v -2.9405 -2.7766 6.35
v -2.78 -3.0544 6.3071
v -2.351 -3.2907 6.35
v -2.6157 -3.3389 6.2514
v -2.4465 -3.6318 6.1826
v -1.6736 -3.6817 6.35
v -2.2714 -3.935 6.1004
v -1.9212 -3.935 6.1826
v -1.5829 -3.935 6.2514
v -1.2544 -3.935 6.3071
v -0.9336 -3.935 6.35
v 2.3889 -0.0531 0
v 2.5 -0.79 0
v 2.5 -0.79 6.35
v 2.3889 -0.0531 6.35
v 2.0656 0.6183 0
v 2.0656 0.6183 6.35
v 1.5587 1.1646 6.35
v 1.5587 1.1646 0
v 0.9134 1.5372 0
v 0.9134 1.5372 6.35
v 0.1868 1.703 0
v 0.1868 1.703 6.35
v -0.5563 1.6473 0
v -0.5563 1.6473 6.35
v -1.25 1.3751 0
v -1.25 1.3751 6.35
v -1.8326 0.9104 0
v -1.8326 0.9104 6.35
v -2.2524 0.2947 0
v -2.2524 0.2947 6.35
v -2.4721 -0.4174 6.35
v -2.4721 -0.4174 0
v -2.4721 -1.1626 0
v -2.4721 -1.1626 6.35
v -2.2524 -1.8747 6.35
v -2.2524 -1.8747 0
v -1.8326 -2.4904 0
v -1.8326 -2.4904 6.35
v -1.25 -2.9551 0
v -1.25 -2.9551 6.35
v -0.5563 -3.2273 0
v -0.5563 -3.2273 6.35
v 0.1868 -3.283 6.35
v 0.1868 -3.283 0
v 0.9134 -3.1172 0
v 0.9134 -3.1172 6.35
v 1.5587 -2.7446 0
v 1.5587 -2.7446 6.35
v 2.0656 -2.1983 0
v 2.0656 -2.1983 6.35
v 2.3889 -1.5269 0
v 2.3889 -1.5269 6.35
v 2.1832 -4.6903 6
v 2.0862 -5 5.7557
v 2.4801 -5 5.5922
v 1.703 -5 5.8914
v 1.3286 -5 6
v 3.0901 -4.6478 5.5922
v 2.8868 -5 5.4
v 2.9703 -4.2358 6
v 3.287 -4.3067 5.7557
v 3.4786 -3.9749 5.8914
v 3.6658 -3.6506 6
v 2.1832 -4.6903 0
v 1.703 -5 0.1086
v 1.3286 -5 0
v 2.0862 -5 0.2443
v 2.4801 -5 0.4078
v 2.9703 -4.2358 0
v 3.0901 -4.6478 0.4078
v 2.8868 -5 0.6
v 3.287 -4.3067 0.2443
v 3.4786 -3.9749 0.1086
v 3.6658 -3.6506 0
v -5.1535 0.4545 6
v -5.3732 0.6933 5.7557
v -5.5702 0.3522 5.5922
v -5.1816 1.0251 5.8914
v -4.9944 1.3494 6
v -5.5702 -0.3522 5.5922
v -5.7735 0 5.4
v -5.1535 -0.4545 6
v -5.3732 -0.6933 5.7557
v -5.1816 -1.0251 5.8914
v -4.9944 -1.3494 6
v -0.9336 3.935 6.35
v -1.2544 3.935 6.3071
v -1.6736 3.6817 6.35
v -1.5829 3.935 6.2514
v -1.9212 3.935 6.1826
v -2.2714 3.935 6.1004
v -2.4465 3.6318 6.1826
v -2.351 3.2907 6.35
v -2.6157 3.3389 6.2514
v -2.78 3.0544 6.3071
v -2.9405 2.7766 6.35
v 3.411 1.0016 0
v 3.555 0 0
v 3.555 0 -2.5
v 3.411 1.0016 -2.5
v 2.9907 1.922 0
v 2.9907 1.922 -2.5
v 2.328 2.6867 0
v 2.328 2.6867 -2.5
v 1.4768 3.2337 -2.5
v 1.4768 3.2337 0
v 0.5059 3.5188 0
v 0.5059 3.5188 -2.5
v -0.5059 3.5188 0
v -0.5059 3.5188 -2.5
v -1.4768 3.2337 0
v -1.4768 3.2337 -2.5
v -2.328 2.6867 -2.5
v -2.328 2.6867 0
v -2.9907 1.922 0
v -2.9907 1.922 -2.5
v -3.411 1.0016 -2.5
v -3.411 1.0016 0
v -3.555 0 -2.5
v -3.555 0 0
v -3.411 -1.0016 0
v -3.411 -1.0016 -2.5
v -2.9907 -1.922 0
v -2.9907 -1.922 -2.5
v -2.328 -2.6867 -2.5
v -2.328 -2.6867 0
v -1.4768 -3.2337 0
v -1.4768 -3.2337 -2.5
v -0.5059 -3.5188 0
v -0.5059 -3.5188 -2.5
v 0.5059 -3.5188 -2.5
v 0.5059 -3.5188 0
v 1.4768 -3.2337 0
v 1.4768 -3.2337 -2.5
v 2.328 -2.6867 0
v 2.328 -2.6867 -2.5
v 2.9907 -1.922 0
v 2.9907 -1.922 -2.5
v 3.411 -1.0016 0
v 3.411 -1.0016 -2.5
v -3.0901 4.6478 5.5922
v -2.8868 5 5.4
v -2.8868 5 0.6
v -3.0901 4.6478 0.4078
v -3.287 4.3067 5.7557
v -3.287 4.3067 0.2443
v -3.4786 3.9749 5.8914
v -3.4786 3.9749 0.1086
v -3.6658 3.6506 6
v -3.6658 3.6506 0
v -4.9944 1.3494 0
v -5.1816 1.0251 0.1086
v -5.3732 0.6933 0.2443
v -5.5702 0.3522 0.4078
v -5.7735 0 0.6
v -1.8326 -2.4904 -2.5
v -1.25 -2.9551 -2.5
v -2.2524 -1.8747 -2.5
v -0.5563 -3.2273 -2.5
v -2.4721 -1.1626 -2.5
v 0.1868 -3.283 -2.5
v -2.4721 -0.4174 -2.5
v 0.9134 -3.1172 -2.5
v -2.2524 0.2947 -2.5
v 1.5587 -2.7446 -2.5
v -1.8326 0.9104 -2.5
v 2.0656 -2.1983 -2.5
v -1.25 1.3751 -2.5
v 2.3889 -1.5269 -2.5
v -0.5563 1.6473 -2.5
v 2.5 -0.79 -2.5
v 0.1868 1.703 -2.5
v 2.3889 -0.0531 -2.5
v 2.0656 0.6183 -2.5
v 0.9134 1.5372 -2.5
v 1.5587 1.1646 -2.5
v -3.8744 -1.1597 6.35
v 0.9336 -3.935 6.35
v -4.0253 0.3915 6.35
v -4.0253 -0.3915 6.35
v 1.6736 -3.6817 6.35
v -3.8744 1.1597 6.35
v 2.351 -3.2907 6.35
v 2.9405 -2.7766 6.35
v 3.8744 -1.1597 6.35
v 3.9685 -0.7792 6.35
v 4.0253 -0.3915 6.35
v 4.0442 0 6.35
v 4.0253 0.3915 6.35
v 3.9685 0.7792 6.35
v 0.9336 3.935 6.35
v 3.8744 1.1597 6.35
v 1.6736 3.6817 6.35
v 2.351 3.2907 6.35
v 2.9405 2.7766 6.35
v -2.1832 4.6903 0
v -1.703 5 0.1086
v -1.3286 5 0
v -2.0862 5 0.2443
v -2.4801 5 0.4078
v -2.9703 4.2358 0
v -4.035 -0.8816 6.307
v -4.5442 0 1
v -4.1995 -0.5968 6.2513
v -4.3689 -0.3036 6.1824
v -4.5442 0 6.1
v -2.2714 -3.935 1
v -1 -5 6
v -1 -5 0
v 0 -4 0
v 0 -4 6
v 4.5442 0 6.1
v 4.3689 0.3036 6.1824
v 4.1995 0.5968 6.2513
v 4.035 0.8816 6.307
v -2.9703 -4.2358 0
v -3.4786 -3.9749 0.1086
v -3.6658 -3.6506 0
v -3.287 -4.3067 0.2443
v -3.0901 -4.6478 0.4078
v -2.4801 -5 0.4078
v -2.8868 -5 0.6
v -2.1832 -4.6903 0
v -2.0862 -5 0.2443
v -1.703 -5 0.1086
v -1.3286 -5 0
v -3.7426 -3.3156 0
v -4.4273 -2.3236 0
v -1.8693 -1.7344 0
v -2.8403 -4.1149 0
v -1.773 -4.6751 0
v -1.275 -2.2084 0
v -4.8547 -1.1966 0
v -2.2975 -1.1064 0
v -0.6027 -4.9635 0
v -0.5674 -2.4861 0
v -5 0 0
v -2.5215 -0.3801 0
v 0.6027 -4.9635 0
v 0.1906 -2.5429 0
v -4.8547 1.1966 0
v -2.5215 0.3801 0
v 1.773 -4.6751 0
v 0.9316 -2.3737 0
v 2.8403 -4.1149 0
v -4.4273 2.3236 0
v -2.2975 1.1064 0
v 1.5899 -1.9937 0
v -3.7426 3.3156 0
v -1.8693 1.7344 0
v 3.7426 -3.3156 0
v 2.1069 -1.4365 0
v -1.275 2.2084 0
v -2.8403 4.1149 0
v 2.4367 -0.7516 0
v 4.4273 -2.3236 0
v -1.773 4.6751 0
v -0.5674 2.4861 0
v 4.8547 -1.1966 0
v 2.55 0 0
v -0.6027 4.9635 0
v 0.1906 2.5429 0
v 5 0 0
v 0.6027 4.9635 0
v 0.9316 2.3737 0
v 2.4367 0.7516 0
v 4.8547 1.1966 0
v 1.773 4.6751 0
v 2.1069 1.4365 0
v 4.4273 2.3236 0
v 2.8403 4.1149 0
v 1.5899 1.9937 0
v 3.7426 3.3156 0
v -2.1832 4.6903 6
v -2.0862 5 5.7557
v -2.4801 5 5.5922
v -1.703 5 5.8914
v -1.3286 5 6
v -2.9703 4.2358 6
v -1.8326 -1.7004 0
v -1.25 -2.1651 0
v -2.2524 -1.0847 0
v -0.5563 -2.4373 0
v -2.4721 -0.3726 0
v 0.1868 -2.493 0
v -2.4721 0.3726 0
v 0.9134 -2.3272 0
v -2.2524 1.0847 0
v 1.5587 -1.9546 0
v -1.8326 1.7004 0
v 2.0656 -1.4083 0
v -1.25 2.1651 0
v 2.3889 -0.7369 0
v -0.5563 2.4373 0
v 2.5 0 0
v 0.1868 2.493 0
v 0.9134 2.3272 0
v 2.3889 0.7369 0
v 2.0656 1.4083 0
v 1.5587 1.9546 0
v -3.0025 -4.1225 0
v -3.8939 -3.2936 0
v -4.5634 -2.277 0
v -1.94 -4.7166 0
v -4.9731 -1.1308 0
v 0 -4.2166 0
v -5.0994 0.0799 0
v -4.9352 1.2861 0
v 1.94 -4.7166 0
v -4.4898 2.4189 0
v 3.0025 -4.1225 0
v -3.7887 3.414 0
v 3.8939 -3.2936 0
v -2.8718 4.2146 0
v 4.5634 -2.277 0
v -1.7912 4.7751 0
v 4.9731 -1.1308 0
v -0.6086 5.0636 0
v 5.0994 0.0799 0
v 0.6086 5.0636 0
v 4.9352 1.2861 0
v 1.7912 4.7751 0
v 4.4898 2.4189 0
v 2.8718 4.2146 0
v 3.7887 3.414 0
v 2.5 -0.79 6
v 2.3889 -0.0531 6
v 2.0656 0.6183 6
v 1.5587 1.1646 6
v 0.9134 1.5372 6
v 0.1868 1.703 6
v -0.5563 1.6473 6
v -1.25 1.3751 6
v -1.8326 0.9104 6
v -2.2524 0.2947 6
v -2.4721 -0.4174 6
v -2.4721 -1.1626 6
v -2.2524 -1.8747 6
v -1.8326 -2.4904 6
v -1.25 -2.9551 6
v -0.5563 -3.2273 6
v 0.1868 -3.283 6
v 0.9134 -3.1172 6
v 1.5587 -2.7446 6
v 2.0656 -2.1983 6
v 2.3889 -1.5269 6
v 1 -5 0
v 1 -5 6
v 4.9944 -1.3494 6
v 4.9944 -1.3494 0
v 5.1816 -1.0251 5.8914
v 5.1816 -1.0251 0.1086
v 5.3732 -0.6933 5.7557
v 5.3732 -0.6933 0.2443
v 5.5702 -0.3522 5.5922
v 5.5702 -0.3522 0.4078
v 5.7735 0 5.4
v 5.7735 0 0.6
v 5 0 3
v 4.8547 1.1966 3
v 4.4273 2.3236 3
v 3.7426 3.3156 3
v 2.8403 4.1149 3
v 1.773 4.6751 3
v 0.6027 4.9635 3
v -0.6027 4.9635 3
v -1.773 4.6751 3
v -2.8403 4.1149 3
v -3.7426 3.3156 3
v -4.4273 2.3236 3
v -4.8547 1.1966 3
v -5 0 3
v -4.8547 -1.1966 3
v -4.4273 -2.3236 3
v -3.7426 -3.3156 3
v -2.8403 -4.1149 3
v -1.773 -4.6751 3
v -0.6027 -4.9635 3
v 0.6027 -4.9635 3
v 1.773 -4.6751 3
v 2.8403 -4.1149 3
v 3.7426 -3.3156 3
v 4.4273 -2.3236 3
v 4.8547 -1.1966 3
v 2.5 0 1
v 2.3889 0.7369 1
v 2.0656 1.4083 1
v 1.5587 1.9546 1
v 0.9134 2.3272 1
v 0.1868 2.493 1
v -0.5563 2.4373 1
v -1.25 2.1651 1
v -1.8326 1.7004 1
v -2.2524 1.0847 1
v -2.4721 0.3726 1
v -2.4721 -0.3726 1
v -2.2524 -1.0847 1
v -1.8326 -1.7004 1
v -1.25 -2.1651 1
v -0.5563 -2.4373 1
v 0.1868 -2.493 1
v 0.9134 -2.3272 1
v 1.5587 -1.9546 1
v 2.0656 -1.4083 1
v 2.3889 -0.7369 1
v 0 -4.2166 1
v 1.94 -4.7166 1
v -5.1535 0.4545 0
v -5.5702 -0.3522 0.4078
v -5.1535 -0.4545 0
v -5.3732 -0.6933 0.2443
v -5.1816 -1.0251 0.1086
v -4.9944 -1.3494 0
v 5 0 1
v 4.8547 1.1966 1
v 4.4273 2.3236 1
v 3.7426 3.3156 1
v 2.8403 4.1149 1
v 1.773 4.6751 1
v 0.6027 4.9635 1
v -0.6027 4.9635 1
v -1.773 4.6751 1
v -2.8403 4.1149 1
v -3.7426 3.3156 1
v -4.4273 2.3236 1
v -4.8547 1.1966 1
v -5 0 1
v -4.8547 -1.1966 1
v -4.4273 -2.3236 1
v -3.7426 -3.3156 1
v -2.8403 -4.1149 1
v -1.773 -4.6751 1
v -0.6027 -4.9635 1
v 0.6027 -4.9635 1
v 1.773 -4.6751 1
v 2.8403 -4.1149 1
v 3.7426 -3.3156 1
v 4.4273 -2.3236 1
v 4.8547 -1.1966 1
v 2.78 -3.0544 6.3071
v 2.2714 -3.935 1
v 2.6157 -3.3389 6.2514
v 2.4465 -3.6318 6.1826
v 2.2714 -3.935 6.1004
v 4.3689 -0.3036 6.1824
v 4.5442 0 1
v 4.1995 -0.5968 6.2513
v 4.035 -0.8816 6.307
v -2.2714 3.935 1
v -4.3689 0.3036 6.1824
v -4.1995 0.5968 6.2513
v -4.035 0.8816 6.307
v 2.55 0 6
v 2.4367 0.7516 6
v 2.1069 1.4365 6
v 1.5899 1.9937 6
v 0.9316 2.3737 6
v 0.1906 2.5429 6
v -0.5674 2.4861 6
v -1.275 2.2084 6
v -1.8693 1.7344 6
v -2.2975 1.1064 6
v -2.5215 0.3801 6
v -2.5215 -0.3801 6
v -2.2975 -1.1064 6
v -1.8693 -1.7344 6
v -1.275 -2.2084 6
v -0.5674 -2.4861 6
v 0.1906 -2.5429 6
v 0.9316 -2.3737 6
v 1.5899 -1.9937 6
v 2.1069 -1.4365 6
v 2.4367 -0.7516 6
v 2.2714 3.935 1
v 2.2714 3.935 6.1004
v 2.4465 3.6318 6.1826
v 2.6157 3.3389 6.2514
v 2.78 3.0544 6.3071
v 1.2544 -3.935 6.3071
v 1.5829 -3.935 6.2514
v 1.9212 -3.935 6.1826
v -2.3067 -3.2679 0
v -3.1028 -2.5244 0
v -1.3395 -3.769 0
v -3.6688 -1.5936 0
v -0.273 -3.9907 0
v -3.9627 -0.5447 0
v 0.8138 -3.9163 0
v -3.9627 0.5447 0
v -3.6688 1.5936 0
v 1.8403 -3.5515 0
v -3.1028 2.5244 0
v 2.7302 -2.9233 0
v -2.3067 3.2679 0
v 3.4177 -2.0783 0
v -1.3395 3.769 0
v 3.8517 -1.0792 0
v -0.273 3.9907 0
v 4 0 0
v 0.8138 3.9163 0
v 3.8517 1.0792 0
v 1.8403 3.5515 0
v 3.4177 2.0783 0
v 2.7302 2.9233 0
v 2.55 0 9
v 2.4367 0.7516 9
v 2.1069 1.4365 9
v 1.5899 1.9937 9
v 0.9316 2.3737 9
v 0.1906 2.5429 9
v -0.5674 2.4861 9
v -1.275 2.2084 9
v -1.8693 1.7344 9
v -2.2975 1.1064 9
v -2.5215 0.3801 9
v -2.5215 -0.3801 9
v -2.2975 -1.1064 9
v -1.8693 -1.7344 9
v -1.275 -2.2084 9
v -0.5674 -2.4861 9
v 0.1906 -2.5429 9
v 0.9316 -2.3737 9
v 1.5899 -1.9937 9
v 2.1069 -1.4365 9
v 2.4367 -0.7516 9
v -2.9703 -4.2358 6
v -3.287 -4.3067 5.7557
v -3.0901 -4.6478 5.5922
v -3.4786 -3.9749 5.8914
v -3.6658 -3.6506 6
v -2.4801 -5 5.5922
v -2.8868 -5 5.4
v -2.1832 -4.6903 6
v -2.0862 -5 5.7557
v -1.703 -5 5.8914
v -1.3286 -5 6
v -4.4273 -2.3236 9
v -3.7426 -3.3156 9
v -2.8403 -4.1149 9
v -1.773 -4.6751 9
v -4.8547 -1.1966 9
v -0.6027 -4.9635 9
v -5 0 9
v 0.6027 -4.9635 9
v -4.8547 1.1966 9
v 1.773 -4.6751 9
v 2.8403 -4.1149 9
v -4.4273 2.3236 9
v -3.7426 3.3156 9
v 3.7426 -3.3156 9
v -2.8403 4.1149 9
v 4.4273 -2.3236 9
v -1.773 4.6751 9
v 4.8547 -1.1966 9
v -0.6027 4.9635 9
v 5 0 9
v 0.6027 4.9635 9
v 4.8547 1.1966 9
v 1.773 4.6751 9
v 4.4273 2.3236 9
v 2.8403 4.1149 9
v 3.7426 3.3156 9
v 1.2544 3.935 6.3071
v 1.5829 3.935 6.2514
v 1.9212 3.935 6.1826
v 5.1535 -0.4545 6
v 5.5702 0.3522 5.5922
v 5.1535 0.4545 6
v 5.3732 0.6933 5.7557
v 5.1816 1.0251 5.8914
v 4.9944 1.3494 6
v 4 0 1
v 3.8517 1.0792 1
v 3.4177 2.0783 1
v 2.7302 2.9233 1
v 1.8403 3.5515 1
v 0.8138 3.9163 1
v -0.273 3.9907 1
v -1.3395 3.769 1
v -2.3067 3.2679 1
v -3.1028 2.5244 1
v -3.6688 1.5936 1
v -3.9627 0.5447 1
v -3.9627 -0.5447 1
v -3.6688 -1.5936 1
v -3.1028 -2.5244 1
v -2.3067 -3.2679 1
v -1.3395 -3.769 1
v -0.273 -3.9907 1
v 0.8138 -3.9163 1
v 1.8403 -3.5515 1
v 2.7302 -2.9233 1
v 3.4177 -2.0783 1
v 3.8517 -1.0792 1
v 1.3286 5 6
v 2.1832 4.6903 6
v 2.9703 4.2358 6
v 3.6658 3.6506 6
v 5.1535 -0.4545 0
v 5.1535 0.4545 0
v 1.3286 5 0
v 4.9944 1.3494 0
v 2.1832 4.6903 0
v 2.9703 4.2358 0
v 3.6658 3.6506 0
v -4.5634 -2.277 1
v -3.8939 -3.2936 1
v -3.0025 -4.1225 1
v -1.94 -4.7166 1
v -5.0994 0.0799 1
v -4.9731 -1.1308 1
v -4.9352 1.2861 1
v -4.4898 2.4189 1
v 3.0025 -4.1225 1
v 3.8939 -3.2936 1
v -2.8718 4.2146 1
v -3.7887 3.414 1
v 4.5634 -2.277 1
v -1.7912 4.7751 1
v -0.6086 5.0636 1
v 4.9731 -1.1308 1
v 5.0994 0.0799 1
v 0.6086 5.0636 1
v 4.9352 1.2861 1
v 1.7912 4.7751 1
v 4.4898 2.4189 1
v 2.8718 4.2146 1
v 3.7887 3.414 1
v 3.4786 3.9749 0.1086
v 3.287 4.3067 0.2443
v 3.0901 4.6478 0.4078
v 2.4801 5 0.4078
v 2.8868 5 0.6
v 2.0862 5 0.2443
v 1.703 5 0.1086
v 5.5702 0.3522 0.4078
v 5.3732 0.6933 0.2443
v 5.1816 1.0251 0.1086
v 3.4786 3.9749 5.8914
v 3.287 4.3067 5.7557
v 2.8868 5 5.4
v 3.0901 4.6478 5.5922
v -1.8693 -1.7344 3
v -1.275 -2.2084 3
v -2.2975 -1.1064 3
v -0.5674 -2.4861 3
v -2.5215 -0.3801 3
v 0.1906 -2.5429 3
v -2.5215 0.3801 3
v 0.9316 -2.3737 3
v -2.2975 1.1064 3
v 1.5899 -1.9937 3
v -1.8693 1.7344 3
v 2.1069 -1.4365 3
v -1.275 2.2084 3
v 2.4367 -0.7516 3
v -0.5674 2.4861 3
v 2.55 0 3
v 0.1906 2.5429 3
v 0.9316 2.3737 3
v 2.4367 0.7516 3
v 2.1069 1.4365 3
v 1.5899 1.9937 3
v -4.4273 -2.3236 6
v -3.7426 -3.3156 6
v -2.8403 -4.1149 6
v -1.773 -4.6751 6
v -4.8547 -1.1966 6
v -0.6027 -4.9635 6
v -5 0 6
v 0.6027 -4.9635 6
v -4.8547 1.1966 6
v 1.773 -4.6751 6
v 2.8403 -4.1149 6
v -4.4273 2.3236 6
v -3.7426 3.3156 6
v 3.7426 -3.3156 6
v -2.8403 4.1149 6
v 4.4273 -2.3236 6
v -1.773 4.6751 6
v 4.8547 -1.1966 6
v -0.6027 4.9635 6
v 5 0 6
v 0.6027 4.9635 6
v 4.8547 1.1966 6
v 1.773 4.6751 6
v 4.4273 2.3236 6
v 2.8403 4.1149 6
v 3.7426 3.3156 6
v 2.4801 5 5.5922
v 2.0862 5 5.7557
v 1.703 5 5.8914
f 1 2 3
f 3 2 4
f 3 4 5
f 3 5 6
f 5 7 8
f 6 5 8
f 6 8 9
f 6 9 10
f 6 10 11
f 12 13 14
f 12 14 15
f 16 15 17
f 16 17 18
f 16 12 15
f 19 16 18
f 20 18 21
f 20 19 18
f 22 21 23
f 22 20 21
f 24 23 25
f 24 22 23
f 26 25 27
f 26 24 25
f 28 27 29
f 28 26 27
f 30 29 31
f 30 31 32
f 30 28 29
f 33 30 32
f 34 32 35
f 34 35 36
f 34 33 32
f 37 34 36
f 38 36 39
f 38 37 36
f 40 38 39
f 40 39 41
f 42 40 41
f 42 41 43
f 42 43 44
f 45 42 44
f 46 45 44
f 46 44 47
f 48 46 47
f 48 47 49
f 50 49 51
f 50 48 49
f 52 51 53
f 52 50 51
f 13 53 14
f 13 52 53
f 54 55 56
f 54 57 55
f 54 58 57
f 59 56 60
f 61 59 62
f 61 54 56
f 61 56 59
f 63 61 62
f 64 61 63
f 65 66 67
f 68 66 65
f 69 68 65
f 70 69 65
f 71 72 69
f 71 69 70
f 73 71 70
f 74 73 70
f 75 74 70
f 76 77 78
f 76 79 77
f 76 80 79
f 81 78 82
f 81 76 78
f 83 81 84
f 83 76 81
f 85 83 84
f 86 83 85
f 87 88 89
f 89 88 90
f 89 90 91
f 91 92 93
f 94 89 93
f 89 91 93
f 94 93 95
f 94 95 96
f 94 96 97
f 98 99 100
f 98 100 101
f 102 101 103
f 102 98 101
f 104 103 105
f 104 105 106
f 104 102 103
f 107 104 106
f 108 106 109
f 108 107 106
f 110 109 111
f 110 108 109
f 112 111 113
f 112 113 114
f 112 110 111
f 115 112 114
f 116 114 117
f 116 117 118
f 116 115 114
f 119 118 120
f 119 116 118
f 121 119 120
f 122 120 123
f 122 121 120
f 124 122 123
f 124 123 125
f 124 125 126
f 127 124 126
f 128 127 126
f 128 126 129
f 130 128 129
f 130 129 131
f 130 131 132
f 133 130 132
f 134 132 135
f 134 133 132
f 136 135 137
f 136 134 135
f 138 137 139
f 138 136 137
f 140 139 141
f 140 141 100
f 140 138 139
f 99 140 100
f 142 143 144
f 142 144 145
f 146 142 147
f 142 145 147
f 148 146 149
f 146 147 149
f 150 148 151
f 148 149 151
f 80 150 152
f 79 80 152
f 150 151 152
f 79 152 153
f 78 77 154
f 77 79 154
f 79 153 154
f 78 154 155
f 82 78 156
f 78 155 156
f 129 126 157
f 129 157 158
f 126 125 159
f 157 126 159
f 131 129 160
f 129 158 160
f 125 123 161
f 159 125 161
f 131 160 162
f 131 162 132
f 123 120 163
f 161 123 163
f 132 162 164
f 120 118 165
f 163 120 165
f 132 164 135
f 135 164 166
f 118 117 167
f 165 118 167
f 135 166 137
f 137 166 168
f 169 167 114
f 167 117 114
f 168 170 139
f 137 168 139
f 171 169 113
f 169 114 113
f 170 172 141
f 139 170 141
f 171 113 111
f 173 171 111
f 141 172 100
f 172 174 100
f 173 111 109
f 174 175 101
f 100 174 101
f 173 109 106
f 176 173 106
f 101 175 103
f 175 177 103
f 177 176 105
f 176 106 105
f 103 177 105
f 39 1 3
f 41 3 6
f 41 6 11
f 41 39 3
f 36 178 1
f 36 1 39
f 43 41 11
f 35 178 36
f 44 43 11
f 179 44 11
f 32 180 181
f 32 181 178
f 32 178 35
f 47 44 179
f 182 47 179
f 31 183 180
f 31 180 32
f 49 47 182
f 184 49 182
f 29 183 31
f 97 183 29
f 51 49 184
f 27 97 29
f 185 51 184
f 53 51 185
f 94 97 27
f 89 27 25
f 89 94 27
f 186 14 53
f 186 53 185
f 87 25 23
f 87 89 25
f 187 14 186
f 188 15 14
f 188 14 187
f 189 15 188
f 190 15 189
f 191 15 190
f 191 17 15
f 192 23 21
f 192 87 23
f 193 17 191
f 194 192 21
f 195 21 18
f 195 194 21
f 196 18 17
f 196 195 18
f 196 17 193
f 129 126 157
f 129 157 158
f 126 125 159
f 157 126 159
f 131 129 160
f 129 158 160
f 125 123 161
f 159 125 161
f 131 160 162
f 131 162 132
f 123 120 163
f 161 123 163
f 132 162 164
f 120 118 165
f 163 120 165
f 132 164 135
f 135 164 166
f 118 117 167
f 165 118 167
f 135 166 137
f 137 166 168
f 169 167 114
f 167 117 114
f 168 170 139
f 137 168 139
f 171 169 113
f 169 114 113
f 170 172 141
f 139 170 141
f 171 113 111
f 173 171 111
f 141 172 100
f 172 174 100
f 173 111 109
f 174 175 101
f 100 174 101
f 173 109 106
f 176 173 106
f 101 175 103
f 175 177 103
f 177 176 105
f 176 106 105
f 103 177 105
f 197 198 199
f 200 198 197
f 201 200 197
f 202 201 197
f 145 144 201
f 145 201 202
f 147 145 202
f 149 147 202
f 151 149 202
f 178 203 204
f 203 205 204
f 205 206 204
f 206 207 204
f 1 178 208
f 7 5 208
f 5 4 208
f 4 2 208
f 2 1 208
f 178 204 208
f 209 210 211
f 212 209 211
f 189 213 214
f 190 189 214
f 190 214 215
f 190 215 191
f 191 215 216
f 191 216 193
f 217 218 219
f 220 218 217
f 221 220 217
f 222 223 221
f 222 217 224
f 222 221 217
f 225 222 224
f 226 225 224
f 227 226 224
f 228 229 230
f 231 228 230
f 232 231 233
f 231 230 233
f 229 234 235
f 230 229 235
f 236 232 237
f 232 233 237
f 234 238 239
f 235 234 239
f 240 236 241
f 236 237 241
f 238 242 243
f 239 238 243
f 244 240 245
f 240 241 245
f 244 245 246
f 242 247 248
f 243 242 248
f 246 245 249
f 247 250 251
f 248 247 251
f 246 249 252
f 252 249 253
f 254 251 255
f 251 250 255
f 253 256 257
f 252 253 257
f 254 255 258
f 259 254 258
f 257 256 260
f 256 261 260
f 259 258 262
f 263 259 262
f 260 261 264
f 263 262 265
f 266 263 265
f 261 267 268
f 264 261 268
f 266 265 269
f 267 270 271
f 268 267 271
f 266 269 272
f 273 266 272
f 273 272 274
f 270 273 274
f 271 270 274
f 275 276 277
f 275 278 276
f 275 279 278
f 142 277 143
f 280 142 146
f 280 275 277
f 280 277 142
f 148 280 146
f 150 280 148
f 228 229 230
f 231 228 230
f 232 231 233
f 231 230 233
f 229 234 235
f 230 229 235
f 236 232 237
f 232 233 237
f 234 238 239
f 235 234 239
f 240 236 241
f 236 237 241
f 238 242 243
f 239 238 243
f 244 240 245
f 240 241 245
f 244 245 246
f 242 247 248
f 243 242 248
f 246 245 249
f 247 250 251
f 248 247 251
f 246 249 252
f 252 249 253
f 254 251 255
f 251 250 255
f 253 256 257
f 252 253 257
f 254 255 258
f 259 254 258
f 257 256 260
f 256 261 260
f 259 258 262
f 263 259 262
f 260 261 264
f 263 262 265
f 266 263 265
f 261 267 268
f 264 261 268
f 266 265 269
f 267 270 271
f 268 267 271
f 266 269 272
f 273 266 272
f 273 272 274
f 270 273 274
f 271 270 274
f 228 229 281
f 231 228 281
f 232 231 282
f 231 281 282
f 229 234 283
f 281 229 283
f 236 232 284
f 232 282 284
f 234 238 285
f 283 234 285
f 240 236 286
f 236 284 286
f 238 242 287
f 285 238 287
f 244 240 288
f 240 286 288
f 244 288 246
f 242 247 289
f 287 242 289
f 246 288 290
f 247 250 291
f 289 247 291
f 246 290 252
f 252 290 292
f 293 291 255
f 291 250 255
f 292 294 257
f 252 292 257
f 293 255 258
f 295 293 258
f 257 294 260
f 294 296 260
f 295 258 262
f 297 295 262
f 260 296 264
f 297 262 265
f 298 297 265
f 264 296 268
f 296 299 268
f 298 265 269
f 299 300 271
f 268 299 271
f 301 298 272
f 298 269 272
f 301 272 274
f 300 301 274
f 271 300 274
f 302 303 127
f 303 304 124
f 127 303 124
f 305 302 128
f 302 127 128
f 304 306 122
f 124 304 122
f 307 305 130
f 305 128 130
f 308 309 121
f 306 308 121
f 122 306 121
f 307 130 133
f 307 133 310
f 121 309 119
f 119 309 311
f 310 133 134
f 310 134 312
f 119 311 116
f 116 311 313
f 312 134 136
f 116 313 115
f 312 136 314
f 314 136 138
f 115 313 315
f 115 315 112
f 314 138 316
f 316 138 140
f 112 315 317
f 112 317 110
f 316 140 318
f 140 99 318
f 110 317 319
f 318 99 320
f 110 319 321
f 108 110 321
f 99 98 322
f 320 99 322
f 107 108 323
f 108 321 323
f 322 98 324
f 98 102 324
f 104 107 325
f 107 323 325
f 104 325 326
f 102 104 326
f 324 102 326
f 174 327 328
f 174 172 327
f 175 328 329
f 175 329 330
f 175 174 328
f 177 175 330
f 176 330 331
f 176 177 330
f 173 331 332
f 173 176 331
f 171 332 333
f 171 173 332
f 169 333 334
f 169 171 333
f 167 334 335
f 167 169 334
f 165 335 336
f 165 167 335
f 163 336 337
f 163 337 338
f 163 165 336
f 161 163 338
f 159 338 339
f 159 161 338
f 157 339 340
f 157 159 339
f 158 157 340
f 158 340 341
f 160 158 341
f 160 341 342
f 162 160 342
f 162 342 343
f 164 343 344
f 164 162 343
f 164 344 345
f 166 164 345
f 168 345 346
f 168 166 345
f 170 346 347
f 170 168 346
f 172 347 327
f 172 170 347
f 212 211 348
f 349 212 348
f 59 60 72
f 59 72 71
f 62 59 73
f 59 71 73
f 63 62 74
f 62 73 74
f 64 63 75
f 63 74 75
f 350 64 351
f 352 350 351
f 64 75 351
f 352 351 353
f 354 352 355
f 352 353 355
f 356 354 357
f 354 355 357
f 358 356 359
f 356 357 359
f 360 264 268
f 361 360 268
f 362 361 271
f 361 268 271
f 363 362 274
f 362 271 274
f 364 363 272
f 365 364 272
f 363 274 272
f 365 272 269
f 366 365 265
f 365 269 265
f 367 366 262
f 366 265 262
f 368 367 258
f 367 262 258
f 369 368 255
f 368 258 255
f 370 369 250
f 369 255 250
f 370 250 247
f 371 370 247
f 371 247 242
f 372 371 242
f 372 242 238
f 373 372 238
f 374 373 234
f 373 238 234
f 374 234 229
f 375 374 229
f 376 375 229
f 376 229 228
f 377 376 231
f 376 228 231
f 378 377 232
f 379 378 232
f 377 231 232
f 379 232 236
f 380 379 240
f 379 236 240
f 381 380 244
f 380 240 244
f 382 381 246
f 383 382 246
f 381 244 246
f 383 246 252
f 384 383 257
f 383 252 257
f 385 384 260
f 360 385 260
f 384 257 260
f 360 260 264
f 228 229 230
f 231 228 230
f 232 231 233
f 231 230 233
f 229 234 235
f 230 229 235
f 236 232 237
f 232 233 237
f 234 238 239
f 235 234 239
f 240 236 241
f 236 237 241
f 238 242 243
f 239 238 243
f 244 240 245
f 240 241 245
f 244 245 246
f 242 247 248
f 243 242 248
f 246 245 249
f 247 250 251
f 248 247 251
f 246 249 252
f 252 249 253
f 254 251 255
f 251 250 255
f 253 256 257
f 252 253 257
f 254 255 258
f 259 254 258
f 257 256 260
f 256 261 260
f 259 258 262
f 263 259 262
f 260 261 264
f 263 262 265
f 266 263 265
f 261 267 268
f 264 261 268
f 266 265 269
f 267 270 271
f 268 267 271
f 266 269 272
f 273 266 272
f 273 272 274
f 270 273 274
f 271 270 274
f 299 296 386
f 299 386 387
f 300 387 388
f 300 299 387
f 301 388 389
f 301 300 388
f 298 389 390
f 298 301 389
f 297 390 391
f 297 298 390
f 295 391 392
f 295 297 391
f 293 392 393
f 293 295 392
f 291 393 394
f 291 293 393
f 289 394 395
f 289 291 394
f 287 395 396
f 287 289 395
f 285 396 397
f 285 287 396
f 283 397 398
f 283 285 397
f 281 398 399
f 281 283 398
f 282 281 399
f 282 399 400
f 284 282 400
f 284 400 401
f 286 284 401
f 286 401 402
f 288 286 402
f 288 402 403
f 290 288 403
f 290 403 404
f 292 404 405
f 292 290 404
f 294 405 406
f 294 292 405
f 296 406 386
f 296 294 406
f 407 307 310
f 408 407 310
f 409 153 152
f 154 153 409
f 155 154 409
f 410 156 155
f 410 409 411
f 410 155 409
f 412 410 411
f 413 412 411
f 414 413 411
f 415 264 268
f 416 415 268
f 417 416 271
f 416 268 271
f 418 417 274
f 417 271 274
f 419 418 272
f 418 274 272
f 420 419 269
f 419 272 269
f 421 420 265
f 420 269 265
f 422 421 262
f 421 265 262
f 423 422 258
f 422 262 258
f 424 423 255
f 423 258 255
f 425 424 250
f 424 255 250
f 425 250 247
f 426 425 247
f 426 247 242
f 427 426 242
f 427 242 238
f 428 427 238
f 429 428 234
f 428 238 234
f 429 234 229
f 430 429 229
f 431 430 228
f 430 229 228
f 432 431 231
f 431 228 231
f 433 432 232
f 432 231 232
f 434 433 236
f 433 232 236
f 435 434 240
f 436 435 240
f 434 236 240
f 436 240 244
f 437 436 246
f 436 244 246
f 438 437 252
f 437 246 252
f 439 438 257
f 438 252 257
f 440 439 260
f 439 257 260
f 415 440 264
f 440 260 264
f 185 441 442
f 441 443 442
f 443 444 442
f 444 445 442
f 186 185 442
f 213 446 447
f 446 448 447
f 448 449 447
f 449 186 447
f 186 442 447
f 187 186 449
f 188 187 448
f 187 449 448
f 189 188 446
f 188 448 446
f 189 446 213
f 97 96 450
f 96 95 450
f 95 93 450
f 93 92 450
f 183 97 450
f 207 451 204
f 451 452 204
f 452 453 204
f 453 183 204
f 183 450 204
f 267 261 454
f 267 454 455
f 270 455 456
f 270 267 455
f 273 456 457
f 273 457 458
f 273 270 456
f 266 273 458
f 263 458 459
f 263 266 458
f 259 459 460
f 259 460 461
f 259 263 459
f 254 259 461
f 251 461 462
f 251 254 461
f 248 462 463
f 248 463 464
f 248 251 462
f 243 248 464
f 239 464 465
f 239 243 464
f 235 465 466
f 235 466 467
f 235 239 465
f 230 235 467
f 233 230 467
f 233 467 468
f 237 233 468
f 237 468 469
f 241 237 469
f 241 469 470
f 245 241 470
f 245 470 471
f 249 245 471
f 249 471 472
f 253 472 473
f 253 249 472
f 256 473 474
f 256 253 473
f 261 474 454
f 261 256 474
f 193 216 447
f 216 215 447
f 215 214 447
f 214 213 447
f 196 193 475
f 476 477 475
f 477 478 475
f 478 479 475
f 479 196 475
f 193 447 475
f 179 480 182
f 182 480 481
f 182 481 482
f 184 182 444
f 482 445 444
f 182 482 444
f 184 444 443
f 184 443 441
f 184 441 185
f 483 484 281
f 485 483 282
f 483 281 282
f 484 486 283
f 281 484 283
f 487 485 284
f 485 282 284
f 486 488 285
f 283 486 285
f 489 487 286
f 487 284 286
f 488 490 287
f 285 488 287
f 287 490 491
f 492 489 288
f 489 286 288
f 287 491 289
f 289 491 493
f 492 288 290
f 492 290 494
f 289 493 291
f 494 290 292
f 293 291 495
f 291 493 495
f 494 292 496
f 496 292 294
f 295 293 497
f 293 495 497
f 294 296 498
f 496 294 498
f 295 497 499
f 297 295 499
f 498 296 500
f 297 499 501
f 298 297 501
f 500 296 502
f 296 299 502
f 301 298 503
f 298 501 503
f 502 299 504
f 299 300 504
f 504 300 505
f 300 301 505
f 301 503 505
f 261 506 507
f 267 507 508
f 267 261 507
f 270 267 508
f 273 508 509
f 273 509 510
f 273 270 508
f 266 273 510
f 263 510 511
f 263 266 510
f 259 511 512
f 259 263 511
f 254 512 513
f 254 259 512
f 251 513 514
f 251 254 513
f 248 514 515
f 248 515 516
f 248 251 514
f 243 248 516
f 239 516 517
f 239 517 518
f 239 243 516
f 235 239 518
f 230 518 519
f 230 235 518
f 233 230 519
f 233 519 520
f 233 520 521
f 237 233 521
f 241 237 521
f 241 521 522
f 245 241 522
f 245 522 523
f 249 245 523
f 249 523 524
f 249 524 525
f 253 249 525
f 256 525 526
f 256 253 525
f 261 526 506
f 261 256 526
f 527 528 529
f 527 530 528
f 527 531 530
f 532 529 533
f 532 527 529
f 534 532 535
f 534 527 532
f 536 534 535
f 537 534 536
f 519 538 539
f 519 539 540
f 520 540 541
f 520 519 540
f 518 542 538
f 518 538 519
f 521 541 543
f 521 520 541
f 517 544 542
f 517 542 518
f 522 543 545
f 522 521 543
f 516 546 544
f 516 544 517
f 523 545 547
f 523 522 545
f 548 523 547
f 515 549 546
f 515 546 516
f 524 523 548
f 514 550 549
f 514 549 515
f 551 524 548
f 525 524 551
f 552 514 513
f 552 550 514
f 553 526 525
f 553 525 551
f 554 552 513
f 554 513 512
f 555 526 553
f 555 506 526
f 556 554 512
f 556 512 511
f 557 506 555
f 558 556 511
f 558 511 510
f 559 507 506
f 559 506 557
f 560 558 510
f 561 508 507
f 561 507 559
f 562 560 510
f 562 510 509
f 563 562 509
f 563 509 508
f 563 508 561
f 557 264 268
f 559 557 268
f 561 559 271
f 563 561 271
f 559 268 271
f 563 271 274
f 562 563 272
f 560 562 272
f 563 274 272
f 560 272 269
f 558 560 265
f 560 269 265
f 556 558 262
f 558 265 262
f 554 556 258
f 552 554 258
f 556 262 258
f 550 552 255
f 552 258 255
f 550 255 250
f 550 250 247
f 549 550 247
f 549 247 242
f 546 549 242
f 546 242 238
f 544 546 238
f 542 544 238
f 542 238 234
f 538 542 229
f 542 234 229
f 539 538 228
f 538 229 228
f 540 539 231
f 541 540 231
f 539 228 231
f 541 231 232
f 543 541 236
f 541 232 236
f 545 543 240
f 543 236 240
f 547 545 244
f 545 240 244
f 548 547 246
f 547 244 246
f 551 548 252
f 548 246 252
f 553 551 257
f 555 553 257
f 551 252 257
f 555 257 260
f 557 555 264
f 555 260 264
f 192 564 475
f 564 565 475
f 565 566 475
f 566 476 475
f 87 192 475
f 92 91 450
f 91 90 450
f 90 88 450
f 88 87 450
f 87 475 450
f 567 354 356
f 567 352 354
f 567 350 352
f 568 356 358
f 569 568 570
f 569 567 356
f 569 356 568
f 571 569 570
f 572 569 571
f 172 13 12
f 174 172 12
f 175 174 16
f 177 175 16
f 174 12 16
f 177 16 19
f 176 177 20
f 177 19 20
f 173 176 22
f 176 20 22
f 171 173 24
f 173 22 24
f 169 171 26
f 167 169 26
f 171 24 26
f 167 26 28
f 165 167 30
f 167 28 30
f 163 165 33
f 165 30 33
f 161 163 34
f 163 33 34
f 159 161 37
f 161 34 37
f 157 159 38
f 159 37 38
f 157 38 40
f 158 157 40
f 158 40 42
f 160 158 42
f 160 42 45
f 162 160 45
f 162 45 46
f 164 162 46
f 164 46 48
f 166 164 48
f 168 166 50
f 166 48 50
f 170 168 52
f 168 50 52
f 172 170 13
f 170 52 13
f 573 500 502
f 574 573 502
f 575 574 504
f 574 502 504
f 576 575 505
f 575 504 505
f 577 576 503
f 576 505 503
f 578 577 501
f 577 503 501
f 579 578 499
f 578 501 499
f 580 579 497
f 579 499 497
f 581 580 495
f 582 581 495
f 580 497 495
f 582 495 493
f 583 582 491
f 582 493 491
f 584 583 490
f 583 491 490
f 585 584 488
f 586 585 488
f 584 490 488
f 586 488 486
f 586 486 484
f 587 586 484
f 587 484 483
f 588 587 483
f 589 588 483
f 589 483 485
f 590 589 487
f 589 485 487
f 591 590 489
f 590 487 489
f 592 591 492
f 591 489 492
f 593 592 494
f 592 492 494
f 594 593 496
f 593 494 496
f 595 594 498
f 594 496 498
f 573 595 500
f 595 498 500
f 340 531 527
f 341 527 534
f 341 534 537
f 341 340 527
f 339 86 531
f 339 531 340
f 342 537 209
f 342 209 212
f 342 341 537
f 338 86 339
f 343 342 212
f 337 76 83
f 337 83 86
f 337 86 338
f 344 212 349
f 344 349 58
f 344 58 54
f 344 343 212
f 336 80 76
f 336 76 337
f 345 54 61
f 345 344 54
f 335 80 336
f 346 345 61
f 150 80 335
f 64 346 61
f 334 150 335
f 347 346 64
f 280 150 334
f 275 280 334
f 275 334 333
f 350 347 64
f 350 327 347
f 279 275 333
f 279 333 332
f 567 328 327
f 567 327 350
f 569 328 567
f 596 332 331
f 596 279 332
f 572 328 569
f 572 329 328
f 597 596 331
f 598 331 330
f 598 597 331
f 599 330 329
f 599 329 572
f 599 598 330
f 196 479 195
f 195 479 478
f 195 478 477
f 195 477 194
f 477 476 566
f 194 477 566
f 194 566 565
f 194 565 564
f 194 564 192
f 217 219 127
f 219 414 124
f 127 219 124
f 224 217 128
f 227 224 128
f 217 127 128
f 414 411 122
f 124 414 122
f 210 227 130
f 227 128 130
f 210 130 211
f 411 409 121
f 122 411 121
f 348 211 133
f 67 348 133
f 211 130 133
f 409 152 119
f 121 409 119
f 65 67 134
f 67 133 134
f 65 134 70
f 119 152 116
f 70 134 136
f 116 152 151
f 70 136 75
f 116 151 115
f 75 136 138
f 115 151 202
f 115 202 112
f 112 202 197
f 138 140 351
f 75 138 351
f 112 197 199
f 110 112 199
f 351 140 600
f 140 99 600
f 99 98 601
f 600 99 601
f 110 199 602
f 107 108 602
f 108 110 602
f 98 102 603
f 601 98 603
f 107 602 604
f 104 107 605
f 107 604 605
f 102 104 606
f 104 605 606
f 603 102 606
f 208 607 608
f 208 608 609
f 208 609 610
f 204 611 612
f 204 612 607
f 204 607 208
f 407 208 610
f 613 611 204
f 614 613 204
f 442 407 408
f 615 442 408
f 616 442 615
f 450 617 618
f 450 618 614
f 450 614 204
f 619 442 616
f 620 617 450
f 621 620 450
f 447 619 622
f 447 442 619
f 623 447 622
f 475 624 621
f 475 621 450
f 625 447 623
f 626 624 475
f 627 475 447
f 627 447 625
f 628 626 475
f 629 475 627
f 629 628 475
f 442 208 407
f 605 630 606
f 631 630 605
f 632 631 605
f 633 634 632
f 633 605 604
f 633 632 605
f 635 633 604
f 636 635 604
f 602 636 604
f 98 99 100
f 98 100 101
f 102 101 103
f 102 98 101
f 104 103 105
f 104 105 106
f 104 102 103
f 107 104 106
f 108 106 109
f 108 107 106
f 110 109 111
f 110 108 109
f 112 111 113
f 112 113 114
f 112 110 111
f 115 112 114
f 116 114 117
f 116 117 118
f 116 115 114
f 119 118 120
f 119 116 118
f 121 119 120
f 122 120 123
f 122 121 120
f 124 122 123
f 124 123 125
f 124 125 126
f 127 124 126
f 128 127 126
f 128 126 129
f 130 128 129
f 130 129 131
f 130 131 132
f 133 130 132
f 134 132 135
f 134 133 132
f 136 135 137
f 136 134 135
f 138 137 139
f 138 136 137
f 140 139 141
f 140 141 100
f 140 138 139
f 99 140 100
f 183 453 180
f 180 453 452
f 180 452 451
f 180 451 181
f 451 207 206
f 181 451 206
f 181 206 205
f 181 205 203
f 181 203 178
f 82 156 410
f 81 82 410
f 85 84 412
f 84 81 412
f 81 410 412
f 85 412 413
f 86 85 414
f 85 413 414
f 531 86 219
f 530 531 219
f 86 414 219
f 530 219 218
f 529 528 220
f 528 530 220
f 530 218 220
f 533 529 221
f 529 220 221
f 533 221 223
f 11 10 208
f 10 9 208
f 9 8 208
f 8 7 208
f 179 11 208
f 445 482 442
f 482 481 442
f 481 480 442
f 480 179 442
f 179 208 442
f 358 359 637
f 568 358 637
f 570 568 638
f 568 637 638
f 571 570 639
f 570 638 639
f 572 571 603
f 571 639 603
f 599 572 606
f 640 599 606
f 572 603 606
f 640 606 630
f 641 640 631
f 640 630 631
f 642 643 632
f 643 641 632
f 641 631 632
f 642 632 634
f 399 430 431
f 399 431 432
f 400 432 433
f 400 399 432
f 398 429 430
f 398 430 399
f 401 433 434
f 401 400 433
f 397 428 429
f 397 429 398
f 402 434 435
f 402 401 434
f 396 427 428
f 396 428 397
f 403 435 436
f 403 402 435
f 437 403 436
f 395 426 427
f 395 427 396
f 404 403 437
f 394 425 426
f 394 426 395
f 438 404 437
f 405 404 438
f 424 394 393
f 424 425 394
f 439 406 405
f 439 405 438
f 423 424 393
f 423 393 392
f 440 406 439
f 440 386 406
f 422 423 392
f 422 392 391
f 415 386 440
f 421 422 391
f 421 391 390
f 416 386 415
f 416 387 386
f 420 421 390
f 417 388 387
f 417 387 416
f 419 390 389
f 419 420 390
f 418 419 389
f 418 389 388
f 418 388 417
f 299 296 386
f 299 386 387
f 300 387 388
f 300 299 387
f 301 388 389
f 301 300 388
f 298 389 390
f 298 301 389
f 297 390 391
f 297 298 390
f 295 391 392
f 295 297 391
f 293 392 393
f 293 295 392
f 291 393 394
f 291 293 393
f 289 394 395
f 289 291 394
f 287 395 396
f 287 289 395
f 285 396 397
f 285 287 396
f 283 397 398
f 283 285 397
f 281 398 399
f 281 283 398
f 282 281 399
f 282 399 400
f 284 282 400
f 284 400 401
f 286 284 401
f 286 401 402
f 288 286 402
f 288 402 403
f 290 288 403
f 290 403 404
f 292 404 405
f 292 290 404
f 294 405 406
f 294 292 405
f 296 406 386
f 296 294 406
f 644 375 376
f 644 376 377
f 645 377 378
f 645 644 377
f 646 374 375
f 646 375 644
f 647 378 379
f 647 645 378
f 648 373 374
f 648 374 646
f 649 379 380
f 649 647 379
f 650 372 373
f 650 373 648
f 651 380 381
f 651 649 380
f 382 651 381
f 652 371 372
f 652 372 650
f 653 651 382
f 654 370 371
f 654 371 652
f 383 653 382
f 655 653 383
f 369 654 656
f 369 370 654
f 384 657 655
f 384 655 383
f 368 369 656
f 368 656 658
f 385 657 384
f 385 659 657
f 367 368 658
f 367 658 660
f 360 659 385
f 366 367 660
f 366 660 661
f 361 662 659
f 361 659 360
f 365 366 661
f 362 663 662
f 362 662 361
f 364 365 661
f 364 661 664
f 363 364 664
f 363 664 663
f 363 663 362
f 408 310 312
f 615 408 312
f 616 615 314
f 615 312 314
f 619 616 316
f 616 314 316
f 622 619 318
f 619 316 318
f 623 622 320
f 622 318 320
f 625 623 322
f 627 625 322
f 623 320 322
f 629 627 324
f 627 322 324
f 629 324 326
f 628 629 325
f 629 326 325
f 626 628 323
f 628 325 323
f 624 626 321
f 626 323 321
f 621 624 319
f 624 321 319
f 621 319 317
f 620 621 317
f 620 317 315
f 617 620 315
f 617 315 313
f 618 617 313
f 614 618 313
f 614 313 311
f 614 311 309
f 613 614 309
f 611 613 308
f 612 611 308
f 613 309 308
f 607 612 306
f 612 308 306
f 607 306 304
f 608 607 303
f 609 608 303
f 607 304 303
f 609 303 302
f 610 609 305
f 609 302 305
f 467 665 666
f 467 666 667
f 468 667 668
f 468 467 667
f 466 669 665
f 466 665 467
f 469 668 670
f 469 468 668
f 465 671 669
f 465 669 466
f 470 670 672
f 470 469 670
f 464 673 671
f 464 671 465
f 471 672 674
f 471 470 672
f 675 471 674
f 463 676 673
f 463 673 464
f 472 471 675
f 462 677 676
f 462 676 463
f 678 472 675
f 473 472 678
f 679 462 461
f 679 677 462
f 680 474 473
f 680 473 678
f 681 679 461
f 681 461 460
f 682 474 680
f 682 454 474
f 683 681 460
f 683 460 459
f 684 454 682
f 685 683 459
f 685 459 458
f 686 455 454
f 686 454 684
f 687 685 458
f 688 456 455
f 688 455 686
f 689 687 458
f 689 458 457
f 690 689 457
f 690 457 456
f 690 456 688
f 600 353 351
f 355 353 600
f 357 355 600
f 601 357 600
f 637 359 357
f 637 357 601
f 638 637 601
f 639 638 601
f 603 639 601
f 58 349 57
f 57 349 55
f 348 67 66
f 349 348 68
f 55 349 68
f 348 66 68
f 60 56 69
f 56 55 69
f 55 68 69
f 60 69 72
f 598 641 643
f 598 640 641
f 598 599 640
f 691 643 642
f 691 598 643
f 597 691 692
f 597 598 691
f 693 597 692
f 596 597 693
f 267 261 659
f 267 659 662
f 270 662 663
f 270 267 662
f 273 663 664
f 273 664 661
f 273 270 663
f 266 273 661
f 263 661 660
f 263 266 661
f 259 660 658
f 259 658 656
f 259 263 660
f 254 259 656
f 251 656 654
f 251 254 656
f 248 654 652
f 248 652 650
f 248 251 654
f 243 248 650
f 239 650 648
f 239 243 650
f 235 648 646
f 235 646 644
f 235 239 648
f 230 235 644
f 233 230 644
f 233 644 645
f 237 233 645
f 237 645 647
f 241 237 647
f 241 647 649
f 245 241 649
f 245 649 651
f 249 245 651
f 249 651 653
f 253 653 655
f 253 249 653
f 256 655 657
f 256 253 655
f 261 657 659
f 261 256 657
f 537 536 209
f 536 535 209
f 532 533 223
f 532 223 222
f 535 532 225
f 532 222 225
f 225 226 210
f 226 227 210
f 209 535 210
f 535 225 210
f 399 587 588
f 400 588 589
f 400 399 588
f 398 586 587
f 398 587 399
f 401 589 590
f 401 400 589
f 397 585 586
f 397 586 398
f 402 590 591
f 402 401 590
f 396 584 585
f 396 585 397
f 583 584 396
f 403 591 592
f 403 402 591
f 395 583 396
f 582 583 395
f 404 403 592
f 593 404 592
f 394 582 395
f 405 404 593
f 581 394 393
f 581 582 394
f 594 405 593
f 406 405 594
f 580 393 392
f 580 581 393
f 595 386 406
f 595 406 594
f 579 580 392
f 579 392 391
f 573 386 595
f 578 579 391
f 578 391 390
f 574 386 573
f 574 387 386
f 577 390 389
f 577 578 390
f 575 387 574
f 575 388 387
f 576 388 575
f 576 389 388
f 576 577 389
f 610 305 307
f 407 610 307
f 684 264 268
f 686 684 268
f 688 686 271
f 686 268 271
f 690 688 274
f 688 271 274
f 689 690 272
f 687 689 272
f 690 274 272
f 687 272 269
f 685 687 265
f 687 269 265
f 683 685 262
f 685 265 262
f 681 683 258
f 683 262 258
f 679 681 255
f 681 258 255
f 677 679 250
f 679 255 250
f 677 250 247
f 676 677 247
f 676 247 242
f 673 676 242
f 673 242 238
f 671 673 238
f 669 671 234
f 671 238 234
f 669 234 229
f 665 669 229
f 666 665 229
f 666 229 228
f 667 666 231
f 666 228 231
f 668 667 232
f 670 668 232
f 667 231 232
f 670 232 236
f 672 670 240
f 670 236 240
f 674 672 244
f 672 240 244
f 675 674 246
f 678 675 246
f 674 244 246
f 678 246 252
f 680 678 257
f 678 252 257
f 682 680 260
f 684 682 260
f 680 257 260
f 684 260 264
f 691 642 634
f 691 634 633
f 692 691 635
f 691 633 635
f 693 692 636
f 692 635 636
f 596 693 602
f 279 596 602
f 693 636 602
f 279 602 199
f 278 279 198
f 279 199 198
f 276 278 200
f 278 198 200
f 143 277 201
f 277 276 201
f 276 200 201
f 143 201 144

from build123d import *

# Parameters (mm, degrees)
F0_R      = 3.555
F0_R_2    = 2.5
F1_DEPTH  = 6.35
F2_DEPTH  = 1
F3_DEPTH  = 2.5
F6_R      = 3.555
F6_R_2    = 2.5
F7_DEPTH  = 2.5
F8_DEPTH  = 6
F11_R     = 5
F11_R_2   = 4
F11_R_3   = 2.5
F12_DEPTH = 1
F13_DEPTH = 1
F14_R     = 5
F14_R_2   = 2.55
F15_DEPTH = 6
F16_DEPTH = 3
F17_DEPTH = 9


with BuildPart() as f1:
    # F0 (on Top) → F1 (new body)
    with BuildSketch(Plane.XY):
        Polygon((2.2713800321, 3.935), (-2.2713800321, 3.935), (-4.5442400564, 0), (-2.2713800321, -3.935), (2.2713800321, -3.935), (4.5442400564, 0), align=None)
        Circle(F0_R, mode=Mode.SUBTRACT)
        Circle(F0_R)
        with Locations((0, -0.79)):
            Circle(F0_R_2, mode=Mode.SUBTRACT)
    extrude(amount=F1_DEPTH)

    # F0 (on Top) → F2 (join)
    with BuildSketch(Plane.XY):
        with BuildLine():
            Line((0, -4.2166089514), (1.94, -4.7166089514))
            ThreePointArc((1.94, -4.7166089514), (0, 5.1), (-1.94, -4.7166089514))
            Line((-1.94, -4.7166089514), (0, -4.2166089514))
        make_face()
        Polygon((-4.5442400564, 0), (-2.2713800321, 3.935), (2.2713800321, 3.935), (4.5442400564, 0), (2.2713800321, -3.935), (-2.2713800321, -3.935), align=None, mode=Mode.SUBTRACT)
    extrude(amount=F2_DEPTH)

    # F0 (on Top) → F3 (join)
    with BuildSketch(Plane.XY):
        Circle(F0_R)
        with Locations((0, -0.79)):
            Circle(F0_R_2, mode=Mode.SUBTRACT)
    extrude(amount=-F3_DEPTH)

    # F4 (on Front) → F5 (revolve, cut)
    with BuildSketch(Plane.XZ):
        Polygon((4.5442400564, 6.1), (4.5442400564, 6.35), (4.0442400564, 6.35), align=None)
    revolve(axis=Axis((0, 0, 3.175), (0, 0, 1)), mode=Mode.SUBTRACT)


with BuildPart() as f7:
    # F6 (on Top) → F7 (new body)
    with BuildSketch(Plane.XY):
        Circle(F6_R)
        with Locations((0, -0.79)):
            Circle(F6_R_2, mode=Mode.SUBTRACT)
    extrude(amount=-F7_DEPTH)

    # F6 (on Top) → F8 (join)
    with BuildSketch(Plane.XY):
        Polygon((2.8867513459, 5), (-2.8867513459, 5), (-5.7735026919, 0), (-2.8867513459, -5), (-1, -5), (0, -4), (1, -5), (2.8867513459, -5), (5.7735026919, 0), align=None)
        Circle(F6_R, mode=Mode.SUBTRACT)
        Circle(F6_R)
        with Locations((0, -0.79)):
            Circle(F6_R_2, mode=Mode.SUBTRACT)
    extrude(amount=F8_DEPTH)

    # F9 (on Front) → F10 (revolve, cut)
    with BuildSketch(Plane.XZ):
        Polygon((-5.1735026919, 6), (-5.7735026919, 6), (-5.7735026919, 5.4), align=None)
        Polygon((-5.1735026919, 0), (-5.7735026919, 0.6), (-5.7735026919, 0), align=None)
    revolve(axis=Axis((0, 0, 1), (0, 0, 1)), mode=Mode.SUBTRACT)


with BuildPart() as f12:
    # F11 (on Top) → F12 (new body)
    with BuildSketch(Plane.XY):
        Circle(F11_R)
        Circle(F11_R_2, mode=Mode.SUBTRACT)
        Circle(F11_R_2)
        Circle(F11_R_3, mode=Mode.SUBTRACT)
    extrude(amount=F12_DEPTH)


with BuildPart() as f13:
    # F11 (on Top) → F13 (new body)
    with BuildSketch(Plane.XY):
        Circle(F11_R_2)
        Circle(F11_R_3, mode=Mode.SUBTRACT)
    extrude(amount=F13_DEPTH)


with BuildPart() as f15:
    # F14 (on Top) → F15 (new body)
    with BuildSketch(Plane.XY):
        Circle(F14_R)
        Circle(F14_R_2, mode=Mode.SUBTRACT)
    extrude(amount=F15_DEPTH)


with BuildPart() as f16:
    # F14 (on Top) → F16 (new body)
    with BuildSketch(Plane.XY):
        Circle(F14_R)
        Circle(F14_R_2, mode=Mode.SUBTRACT)
    extrude(amount=F16_DEPTH)


with BuildPart() as f17:
    # F14 (on Top) → F17 (new body)
    with BuildSketch(Plane.XY):
        Circle(F14_R)
        Circle(F14_R_2, mode=Mode.SUBTRACT)
    extrude(amount=F17_DEPTH)


solid = Compound([f1.part, f7.part, f12.part, f13.part, f15.part, f16.part, f17.part])
